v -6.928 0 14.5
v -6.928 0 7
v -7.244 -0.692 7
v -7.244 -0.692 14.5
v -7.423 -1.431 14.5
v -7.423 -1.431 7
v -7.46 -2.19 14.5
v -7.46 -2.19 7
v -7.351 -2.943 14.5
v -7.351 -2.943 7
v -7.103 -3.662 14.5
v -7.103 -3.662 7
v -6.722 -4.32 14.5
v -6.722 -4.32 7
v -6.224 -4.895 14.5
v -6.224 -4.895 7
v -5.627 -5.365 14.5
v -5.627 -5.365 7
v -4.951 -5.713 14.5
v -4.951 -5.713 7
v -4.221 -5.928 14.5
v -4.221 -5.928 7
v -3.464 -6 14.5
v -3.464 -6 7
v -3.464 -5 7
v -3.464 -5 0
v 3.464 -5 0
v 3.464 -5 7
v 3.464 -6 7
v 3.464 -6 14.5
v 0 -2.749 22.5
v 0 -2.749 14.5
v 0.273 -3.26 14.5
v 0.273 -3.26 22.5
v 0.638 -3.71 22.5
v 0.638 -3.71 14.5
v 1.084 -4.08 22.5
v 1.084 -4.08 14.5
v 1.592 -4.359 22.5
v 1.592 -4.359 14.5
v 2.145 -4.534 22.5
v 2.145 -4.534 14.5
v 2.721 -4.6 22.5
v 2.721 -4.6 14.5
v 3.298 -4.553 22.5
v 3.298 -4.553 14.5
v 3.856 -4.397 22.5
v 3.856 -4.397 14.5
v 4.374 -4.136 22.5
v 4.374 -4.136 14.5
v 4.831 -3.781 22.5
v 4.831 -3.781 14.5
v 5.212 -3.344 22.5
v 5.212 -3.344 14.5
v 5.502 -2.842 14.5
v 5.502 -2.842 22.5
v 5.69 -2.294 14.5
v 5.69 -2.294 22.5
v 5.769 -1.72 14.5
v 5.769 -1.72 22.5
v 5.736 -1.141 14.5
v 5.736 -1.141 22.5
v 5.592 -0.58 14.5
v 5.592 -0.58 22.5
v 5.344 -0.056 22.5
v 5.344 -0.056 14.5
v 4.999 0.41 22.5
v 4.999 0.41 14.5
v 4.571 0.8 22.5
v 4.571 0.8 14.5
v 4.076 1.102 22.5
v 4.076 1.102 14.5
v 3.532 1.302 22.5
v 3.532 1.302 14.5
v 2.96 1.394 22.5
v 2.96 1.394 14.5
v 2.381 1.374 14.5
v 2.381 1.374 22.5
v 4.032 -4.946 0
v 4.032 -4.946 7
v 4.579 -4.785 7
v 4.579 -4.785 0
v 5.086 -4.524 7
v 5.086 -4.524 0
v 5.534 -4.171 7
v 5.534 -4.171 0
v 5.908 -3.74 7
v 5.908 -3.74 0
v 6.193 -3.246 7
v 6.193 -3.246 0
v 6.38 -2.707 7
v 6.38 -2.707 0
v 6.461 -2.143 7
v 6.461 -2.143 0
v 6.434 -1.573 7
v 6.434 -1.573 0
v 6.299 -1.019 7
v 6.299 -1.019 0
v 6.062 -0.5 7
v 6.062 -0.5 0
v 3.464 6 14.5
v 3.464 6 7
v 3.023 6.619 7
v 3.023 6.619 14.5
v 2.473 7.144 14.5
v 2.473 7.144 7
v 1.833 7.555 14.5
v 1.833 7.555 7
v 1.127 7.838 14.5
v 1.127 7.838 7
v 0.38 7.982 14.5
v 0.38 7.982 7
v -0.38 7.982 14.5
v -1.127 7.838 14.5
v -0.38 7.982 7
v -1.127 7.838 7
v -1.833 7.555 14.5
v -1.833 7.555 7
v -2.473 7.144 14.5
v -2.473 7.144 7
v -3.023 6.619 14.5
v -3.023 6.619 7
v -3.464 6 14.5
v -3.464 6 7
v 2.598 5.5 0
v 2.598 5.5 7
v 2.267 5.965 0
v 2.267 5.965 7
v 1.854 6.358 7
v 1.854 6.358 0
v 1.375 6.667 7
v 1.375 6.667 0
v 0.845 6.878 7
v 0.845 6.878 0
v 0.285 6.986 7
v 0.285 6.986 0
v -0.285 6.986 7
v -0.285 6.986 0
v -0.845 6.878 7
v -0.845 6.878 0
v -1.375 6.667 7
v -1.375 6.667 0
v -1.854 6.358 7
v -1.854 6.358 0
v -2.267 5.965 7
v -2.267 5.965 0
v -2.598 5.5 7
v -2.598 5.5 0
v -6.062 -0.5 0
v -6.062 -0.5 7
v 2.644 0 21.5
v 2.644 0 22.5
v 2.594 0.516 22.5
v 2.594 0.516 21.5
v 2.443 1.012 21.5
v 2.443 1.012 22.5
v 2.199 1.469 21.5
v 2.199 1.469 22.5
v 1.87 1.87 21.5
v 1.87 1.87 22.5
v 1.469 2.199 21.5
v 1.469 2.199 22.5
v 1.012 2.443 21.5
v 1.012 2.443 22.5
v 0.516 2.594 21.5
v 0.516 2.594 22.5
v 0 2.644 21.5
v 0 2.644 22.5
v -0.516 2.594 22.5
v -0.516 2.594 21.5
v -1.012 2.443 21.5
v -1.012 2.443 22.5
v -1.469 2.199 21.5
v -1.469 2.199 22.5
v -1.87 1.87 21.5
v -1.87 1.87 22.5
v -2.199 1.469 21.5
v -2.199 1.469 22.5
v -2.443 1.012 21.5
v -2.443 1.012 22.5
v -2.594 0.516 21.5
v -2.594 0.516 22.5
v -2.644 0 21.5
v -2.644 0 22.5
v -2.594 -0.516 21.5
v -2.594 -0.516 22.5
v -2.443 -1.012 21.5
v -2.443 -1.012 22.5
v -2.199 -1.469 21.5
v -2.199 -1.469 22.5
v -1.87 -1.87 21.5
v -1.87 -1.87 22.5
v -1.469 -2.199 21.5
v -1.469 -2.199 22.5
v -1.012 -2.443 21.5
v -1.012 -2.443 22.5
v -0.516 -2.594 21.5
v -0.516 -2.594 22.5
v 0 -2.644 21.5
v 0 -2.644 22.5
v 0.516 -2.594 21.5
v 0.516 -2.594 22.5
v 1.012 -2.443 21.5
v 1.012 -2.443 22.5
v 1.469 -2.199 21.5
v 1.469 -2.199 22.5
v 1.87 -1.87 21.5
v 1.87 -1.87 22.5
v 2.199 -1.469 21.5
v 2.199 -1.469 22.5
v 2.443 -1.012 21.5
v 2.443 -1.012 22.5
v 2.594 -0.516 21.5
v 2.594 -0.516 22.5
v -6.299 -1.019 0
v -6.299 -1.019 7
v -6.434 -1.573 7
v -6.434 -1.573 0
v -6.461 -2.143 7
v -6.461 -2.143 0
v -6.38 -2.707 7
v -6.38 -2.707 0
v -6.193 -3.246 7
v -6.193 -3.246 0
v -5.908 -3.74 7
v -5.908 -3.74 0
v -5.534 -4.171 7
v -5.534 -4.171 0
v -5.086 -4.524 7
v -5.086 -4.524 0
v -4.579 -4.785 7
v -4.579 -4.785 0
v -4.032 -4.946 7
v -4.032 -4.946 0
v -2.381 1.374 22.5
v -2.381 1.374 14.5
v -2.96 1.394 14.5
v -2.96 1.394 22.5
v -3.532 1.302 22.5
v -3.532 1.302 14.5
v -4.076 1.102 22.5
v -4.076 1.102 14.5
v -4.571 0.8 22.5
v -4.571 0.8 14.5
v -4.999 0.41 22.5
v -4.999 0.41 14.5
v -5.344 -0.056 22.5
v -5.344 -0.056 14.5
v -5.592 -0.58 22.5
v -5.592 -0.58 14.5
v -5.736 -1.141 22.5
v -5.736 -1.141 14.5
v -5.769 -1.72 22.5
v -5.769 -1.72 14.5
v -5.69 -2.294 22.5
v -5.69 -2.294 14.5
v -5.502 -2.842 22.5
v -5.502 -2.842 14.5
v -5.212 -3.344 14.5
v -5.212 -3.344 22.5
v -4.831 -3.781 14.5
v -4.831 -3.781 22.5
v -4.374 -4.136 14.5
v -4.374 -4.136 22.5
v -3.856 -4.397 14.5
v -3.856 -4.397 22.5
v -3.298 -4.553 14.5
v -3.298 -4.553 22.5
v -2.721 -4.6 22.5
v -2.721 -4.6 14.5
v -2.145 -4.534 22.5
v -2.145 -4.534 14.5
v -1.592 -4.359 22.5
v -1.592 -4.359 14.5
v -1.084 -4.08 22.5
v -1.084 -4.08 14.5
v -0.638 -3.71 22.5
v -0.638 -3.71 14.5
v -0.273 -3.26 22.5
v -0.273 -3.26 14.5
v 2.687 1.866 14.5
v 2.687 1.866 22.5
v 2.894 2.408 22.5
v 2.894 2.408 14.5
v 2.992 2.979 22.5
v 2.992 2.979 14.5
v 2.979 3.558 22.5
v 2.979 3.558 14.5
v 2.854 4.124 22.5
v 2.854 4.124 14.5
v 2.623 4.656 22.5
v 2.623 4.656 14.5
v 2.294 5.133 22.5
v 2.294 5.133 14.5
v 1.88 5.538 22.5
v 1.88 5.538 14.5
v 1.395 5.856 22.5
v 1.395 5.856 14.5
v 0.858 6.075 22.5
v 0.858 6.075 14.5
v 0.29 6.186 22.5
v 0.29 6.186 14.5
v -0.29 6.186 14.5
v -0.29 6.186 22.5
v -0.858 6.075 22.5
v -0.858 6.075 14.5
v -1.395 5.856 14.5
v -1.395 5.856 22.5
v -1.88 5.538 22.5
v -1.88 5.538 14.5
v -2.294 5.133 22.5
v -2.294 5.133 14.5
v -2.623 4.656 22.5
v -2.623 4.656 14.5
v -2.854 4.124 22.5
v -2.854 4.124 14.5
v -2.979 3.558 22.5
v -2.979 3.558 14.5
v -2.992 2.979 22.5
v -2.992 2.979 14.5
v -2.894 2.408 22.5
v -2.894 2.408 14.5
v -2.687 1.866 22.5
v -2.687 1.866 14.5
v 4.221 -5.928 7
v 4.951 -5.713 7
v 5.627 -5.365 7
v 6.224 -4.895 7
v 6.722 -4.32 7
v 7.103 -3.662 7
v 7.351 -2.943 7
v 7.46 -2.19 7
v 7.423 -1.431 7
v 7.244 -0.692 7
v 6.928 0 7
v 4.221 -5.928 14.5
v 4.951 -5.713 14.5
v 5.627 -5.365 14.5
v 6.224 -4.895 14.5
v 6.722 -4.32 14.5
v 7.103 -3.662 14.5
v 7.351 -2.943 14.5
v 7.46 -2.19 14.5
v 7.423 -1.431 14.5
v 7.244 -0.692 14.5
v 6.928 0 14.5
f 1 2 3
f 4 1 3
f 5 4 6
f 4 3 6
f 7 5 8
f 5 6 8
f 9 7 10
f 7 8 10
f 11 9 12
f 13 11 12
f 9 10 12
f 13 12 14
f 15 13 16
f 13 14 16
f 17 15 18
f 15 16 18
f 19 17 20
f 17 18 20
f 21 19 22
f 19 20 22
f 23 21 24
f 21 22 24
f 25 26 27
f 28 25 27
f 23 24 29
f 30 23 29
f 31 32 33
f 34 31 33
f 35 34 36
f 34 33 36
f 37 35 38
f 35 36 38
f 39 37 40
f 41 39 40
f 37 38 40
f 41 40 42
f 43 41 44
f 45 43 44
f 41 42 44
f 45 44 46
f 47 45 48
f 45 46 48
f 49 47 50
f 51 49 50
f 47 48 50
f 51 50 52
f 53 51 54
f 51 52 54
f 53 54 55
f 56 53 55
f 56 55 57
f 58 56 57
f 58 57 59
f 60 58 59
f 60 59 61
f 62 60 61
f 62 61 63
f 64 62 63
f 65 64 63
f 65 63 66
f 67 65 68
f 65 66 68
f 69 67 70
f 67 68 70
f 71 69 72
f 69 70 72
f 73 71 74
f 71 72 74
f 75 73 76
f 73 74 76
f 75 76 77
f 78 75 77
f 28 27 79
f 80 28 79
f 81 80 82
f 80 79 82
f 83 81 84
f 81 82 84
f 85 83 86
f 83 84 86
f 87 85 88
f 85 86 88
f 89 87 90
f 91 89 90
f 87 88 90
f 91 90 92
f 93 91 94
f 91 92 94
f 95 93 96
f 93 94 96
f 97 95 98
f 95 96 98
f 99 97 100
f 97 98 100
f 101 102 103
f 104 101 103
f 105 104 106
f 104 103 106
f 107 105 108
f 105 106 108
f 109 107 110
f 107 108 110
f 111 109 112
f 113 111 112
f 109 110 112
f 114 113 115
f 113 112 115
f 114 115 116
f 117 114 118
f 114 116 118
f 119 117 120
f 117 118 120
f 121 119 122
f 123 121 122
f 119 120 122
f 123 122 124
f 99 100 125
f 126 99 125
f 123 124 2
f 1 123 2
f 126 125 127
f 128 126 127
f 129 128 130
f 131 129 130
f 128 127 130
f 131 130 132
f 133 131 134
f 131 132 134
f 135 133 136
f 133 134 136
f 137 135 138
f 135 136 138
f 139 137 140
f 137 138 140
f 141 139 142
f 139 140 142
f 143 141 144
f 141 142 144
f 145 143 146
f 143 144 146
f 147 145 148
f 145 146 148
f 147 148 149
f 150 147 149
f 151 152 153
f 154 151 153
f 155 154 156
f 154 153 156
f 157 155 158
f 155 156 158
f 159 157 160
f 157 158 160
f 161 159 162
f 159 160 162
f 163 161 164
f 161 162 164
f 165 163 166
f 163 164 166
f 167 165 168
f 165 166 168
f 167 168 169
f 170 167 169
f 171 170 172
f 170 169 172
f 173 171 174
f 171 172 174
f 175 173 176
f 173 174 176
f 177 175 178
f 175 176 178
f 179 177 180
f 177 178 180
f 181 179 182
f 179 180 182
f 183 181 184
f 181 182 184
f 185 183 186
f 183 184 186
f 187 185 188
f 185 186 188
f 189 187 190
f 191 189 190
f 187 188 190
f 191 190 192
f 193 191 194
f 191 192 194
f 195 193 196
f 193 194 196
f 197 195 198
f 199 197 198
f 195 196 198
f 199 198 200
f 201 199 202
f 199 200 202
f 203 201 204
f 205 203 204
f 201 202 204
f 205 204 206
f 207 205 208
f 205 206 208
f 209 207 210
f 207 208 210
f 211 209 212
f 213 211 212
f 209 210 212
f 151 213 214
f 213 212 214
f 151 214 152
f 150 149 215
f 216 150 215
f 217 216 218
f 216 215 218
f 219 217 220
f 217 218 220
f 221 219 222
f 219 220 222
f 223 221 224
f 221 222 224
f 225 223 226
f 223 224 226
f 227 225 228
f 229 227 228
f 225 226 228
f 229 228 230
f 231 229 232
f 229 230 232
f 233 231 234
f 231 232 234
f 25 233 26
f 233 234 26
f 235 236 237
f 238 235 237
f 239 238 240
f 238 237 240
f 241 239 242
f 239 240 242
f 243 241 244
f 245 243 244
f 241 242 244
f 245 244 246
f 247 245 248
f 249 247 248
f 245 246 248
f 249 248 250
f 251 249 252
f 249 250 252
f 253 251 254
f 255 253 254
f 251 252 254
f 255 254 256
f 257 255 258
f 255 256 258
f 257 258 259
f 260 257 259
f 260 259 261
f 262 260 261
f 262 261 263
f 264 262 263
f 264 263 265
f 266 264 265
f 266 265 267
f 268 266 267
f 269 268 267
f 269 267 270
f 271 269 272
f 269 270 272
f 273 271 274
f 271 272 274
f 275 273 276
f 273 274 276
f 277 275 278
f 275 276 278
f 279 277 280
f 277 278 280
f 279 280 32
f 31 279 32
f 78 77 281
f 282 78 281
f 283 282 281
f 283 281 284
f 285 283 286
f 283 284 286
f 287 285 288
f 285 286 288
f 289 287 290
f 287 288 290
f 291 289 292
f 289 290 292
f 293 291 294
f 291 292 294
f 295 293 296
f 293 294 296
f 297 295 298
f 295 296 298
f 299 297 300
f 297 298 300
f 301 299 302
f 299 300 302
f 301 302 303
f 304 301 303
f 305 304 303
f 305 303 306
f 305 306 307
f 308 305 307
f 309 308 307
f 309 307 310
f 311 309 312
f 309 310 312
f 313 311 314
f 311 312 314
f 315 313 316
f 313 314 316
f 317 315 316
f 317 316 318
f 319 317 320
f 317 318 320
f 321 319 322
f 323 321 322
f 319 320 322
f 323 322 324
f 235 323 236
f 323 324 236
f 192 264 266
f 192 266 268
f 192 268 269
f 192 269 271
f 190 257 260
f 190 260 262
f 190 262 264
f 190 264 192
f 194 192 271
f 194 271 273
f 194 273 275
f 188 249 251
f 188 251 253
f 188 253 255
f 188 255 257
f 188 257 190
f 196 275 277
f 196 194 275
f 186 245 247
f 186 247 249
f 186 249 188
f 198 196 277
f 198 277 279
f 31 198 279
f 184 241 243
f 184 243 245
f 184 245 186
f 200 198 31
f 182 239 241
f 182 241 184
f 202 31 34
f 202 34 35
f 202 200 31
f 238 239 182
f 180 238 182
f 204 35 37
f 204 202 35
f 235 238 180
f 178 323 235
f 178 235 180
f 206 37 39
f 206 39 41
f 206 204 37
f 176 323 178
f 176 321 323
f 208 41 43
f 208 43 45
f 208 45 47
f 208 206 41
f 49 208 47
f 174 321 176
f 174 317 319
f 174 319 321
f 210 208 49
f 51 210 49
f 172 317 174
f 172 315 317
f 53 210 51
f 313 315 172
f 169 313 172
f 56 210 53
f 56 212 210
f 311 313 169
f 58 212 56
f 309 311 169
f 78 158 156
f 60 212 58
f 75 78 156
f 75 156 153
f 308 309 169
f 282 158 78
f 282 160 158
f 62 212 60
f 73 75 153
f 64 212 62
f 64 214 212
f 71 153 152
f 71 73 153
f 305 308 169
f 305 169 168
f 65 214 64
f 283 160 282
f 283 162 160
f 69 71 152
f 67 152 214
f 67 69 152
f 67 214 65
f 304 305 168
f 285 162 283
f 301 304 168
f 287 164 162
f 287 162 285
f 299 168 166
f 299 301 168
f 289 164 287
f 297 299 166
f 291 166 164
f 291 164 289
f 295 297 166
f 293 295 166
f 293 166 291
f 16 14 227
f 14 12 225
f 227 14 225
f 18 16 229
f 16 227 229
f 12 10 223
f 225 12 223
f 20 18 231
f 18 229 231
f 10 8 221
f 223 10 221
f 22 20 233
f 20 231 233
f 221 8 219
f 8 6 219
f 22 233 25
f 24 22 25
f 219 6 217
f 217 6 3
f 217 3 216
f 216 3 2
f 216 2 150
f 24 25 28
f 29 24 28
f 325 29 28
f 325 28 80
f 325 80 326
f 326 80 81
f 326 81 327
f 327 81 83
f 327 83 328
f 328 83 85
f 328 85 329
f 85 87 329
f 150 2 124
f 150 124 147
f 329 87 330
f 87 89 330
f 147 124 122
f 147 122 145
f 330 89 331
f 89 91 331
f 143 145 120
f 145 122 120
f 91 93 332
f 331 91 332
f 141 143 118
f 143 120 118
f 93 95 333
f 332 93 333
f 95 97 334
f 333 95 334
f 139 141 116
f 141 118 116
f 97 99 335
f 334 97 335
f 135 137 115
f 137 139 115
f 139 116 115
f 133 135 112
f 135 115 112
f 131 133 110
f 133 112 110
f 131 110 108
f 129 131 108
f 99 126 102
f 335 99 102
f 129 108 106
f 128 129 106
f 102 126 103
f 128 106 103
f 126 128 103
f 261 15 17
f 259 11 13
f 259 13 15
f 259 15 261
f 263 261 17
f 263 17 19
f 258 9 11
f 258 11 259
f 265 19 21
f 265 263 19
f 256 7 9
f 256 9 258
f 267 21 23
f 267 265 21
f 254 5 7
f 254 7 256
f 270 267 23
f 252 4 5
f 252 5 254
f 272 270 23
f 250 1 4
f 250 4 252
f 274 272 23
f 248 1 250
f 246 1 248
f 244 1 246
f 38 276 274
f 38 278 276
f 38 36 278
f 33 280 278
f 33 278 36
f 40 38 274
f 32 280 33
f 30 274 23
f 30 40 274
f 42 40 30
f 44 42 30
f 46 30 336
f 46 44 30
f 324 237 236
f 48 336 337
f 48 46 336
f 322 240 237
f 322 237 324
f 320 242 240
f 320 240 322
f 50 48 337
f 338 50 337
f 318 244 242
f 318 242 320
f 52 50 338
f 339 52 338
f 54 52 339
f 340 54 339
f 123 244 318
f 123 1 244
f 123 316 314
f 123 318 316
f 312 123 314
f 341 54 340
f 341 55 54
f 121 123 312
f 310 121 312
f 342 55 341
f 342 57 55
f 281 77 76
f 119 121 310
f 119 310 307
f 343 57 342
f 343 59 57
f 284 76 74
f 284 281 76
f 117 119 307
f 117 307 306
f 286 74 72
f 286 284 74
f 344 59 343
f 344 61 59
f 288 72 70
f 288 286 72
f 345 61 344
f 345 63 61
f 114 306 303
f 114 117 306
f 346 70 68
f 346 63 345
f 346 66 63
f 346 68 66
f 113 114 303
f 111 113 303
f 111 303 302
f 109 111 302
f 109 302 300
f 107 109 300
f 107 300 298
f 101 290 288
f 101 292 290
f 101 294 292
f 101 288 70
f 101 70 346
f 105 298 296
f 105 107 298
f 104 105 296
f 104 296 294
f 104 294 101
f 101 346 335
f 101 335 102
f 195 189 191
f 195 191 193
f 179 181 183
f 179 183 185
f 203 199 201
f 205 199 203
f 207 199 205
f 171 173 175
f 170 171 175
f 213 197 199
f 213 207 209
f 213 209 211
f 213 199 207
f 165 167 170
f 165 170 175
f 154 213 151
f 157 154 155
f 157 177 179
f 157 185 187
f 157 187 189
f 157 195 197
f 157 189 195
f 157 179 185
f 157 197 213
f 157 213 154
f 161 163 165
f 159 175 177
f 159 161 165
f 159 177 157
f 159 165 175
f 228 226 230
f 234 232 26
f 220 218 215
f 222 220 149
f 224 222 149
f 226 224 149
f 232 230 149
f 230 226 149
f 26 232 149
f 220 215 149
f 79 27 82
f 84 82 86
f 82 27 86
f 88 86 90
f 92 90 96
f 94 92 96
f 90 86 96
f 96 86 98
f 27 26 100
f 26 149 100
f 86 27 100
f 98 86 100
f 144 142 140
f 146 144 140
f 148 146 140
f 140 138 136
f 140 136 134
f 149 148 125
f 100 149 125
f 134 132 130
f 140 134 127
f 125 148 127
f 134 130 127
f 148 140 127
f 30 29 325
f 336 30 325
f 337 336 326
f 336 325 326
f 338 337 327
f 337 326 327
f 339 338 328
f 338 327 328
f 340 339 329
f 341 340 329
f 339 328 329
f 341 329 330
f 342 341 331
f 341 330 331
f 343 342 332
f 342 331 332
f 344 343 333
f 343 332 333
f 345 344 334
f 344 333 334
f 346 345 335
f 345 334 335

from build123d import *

# Parameters (mm, degrees)
EXTRUDE_1_DEPTH     = 7
EXTRUDE_2_DEPTH     = 7.5
EXTRUDE_3_DEPTH     = 8
SKETCH_4_R          = 2.644424532
CUT_EXTRUDE_1_DEPTH = 1


with BuildPart() as part:
    # ｽｹｯﾁ1 → ﾎﾞｽ - 押し出し1 (new body)
    with BuildSketch(Plane.XY):
        with BuildLine():
            Line((-2.598076211, 5.5), (-6.062177826, -0.5))
            ThreePointArc((-6.062177826, -0.5), (-6.062177826, -3.5), (-3.464101615, -5))
            Line((-3.464101615, -5), (3.464101615, -5))
            ThreePointArc((3.464101615, -5), (6.062177826, -3.5), (6.062177826, -0.5))
            Line((6.062177826, -0.5), (2.598076211, 5.5))
            ThreePointArc((2.598076211, 5.5), (0, 7), (-2.598076211, 5.5))
        make_face()
    extrude(amount=EXTRUDE_1_DEPTH)

    # ｽｹｯﾁ2 → ﾎﾞｽ - 押し出し2 (add)
    with BuildSketch(Plane.XY.offset(7)):
        with BuildLine():
            Line((6.92820323, 0), (3.464101615, 6))
            ThreePointArc((3.464101615, 6), (0, 8), (-3.464101615, 6))
            Line((-3.464101615, 6), (-6.92820323, 0))
            ThreePointArc((-6.92820323, 0), (-6.92820323, -4), (-3.464101615, -6))
            Line((-3.464101615, -6), (3.464101615, -6))
            ThreePointArc((3.464101615, -6), (6.92820323, -4), (6.92820323, 0))
        make_face()
    extrude(amount=EXTRUDE_2_DEPTH)

    # ｽｹｯﾁ3 → ﾎﾞｽ - 押し出し3 (add)
    with BuildSketch(Plane.XY.offset(14.5)):
        with BuildLine():
            ThreePointArc((-2.380628083, 1.374456265), (-5.369357503, -3.1), (0, -2.748912529))
            ThreePointArc((0, -2.748912529), (5.369357503, -3.1), (2.380628083, 1.374456265))
            ThreePointArc((2.380628083, 1.374456265), (0, 6.2), (-2.380628083, 1.374456265))
        make_face()
    extrude(amount=EXTRUDE_3_DEPTH)

    # ｽｹｯﾁ4 → ｶｯﾄ - 押し出し1 (cut)
    with BuildSketch(Plane.XY.offset(22.5)):
        Circle(SKETCH_4_R)
    extrude(amount=-CUT_EXTRUDE_1_DEPTH, mode=Mode.SUBTRACT)


solid = part.part
